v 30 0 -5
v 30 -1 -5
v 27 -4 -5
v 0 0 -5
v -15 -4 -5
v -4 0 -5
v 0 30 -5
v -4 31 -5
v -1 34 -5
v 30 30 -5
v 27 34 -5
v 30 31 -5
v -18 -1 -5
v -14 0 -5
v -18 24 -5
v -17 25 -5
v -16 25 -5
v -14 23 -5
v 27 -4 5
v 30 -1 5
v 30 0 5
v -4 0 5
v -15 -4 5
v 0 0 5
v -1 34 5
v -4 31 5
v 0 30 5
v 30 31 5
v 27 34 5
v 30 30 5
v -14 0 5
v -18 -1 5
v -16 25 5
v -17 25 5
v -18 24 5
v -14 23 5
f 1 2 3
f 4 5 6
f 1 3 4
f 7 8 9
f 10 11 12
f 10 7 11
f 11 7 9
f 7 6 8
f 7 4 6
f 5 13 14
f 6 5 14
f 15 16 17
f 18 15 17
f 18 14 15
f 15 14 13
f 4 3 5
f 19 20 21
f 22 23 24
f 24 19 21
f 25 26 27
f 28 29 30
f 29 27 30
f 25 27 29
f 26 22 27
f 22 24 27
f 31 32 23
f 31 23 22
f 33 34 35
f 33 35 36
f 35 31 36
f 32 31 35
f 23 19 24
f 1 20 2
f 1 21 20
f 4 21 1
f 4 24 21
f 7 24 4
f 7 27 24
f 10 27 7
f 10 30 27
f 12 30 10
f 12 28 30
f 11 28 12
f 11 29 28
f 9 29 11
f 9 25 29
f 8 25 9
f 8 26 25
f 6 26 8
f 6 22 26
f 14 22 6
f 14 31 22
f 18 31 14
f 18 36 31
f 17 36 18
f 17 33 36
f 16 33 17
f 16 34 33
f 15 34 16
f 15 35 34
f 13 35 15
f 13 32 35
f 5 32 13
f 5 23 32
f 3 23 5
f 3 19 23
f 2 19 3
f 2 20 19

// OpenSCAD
// Strenght of your Table in mm
tabletop = 30; // [18:60]
// Width of the Hook in mm
width = 10; // [8:30]
// Choose with or without barb
closedhook = "false"; // [true,false]
// The depth of the hook
depth = 10; // [7:30]

str = tabletop;
mst = str *0.7;

if (closedhook=="true") {
linear_extrude(height = width , center = true, convexity = 10, twist = 0)
polygon(points=[[0,0],[30,0],[30,-1],[27,-4],[-depth-5,-4],[-depth-8,-1],[-depth-8,str+1],[-depth-5,str+4],[-depth,str+4],[-depth+1,str+3],[-depth+1,str+1],[-depth,str],[-depth-3,str],[-depth-4,str-1],[-depth-4,0],[-4,0],[-4,str+1],[-1,str+4],[27,str+4],[30,str+1],[30,str],[0,str]]); }
else {
linear_extrude(height = width , center = true, convexity = 10, twist = 0)
polygon(points=[[0,0],[30,0],[30,-1],[27,-4],[-depth-5,-4],[-depth-8,-1],[-depth-8,mst+3],[-depth-7,mst+4],[-depth-6,mst+4],[-depth-4,mst+2],[-depth-4,0],[-4,0],[-4,str+1],[-1,str+4],[27,str+4],[30,str+1],[30,str],[0,str]]); }
